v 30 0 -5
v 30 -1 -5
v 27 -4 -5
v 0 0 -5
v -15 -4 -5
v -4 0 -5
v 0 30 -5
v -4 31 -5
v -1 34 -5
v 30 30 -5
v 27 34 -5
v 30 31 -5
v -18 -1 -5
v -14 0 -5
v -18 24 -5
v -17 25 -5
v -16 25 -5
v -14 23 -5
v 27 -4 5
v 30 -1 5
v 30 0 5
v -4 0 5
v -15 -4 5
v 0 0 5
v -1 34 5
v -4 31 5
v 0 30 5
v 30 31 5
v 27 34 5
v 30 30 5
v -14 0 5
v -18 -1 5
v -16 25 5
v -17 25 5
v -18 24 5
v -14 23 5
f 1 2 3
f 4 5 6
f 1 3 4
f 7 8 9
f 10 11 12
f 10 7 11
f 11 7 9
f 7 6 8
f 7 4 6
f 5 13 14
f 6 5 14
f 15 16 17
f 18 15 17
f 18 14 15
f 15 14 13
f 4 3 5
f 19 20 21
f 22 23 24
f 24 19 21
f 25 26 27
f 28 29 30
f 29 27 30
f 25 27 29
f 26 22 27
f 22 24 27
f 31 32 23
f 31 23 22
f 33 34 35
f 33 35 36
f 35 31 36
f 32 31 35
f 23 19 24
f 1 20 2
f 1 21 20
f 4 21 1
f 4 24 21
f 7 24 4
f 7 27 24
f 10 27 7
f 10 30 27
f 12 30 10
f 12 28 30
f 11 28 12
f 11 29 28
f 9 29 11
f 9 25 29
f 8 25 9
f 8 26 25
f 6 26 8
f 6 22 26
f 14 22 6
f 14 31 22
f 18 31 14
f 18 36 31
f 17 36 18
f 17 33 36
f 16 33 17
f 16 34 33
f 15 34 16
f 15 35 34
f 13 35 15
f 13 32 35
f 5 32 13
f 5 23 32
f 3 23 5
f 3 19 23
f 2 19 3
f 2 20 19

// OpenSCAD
// Strenght of your Table in mm
tabletop = 30; // [18:60]
// Width of the Hook in mm
width = 10; // [8:30]
// Choose with or without barb
closedhook = "false"; // [true,false]
// The depth of the hook
depth = 10; // [7:30]

str = tabletop;
mst = str *0.7;

if (closedhook=="true") {
linear_extrude(height = width , center = true, convexity = 10, twist = 0)
polygon(points=[[0,0],[30,0],[30,-1],[27,-4],[-depth-5,-4],[-depth-8,-1],[-depth-8,str+1],[-depth-5,str+4],[-depth,str+4],[-depth+1,str+3],[-depth+1,str+1],[-depth,str],[-depth-3,str],[-depth-4,str-1],[-depth-4,0],[-4,0],[-4,str+1],[-1,str+4],[27,str+4],[30,str+1],[30,str],[0,str]]); }
else {
linear_extrude(height = width , center = true, convexity = 10, twist = 0)
polygon(points=[[0,0],[30,0],[30,-1],[27,-4],[-depth-5,-4],[-depth-8,-1],[-depth-8,mst+3],[-depth-7,mst+4],[-depth-6,mst+4],[-depth-4,mst+2],[-depth-4,0],[-4,0],[-4,str+1],[-1,str+4],[27,str+4],[30,str+1],[30,str],[0,str]]); }
